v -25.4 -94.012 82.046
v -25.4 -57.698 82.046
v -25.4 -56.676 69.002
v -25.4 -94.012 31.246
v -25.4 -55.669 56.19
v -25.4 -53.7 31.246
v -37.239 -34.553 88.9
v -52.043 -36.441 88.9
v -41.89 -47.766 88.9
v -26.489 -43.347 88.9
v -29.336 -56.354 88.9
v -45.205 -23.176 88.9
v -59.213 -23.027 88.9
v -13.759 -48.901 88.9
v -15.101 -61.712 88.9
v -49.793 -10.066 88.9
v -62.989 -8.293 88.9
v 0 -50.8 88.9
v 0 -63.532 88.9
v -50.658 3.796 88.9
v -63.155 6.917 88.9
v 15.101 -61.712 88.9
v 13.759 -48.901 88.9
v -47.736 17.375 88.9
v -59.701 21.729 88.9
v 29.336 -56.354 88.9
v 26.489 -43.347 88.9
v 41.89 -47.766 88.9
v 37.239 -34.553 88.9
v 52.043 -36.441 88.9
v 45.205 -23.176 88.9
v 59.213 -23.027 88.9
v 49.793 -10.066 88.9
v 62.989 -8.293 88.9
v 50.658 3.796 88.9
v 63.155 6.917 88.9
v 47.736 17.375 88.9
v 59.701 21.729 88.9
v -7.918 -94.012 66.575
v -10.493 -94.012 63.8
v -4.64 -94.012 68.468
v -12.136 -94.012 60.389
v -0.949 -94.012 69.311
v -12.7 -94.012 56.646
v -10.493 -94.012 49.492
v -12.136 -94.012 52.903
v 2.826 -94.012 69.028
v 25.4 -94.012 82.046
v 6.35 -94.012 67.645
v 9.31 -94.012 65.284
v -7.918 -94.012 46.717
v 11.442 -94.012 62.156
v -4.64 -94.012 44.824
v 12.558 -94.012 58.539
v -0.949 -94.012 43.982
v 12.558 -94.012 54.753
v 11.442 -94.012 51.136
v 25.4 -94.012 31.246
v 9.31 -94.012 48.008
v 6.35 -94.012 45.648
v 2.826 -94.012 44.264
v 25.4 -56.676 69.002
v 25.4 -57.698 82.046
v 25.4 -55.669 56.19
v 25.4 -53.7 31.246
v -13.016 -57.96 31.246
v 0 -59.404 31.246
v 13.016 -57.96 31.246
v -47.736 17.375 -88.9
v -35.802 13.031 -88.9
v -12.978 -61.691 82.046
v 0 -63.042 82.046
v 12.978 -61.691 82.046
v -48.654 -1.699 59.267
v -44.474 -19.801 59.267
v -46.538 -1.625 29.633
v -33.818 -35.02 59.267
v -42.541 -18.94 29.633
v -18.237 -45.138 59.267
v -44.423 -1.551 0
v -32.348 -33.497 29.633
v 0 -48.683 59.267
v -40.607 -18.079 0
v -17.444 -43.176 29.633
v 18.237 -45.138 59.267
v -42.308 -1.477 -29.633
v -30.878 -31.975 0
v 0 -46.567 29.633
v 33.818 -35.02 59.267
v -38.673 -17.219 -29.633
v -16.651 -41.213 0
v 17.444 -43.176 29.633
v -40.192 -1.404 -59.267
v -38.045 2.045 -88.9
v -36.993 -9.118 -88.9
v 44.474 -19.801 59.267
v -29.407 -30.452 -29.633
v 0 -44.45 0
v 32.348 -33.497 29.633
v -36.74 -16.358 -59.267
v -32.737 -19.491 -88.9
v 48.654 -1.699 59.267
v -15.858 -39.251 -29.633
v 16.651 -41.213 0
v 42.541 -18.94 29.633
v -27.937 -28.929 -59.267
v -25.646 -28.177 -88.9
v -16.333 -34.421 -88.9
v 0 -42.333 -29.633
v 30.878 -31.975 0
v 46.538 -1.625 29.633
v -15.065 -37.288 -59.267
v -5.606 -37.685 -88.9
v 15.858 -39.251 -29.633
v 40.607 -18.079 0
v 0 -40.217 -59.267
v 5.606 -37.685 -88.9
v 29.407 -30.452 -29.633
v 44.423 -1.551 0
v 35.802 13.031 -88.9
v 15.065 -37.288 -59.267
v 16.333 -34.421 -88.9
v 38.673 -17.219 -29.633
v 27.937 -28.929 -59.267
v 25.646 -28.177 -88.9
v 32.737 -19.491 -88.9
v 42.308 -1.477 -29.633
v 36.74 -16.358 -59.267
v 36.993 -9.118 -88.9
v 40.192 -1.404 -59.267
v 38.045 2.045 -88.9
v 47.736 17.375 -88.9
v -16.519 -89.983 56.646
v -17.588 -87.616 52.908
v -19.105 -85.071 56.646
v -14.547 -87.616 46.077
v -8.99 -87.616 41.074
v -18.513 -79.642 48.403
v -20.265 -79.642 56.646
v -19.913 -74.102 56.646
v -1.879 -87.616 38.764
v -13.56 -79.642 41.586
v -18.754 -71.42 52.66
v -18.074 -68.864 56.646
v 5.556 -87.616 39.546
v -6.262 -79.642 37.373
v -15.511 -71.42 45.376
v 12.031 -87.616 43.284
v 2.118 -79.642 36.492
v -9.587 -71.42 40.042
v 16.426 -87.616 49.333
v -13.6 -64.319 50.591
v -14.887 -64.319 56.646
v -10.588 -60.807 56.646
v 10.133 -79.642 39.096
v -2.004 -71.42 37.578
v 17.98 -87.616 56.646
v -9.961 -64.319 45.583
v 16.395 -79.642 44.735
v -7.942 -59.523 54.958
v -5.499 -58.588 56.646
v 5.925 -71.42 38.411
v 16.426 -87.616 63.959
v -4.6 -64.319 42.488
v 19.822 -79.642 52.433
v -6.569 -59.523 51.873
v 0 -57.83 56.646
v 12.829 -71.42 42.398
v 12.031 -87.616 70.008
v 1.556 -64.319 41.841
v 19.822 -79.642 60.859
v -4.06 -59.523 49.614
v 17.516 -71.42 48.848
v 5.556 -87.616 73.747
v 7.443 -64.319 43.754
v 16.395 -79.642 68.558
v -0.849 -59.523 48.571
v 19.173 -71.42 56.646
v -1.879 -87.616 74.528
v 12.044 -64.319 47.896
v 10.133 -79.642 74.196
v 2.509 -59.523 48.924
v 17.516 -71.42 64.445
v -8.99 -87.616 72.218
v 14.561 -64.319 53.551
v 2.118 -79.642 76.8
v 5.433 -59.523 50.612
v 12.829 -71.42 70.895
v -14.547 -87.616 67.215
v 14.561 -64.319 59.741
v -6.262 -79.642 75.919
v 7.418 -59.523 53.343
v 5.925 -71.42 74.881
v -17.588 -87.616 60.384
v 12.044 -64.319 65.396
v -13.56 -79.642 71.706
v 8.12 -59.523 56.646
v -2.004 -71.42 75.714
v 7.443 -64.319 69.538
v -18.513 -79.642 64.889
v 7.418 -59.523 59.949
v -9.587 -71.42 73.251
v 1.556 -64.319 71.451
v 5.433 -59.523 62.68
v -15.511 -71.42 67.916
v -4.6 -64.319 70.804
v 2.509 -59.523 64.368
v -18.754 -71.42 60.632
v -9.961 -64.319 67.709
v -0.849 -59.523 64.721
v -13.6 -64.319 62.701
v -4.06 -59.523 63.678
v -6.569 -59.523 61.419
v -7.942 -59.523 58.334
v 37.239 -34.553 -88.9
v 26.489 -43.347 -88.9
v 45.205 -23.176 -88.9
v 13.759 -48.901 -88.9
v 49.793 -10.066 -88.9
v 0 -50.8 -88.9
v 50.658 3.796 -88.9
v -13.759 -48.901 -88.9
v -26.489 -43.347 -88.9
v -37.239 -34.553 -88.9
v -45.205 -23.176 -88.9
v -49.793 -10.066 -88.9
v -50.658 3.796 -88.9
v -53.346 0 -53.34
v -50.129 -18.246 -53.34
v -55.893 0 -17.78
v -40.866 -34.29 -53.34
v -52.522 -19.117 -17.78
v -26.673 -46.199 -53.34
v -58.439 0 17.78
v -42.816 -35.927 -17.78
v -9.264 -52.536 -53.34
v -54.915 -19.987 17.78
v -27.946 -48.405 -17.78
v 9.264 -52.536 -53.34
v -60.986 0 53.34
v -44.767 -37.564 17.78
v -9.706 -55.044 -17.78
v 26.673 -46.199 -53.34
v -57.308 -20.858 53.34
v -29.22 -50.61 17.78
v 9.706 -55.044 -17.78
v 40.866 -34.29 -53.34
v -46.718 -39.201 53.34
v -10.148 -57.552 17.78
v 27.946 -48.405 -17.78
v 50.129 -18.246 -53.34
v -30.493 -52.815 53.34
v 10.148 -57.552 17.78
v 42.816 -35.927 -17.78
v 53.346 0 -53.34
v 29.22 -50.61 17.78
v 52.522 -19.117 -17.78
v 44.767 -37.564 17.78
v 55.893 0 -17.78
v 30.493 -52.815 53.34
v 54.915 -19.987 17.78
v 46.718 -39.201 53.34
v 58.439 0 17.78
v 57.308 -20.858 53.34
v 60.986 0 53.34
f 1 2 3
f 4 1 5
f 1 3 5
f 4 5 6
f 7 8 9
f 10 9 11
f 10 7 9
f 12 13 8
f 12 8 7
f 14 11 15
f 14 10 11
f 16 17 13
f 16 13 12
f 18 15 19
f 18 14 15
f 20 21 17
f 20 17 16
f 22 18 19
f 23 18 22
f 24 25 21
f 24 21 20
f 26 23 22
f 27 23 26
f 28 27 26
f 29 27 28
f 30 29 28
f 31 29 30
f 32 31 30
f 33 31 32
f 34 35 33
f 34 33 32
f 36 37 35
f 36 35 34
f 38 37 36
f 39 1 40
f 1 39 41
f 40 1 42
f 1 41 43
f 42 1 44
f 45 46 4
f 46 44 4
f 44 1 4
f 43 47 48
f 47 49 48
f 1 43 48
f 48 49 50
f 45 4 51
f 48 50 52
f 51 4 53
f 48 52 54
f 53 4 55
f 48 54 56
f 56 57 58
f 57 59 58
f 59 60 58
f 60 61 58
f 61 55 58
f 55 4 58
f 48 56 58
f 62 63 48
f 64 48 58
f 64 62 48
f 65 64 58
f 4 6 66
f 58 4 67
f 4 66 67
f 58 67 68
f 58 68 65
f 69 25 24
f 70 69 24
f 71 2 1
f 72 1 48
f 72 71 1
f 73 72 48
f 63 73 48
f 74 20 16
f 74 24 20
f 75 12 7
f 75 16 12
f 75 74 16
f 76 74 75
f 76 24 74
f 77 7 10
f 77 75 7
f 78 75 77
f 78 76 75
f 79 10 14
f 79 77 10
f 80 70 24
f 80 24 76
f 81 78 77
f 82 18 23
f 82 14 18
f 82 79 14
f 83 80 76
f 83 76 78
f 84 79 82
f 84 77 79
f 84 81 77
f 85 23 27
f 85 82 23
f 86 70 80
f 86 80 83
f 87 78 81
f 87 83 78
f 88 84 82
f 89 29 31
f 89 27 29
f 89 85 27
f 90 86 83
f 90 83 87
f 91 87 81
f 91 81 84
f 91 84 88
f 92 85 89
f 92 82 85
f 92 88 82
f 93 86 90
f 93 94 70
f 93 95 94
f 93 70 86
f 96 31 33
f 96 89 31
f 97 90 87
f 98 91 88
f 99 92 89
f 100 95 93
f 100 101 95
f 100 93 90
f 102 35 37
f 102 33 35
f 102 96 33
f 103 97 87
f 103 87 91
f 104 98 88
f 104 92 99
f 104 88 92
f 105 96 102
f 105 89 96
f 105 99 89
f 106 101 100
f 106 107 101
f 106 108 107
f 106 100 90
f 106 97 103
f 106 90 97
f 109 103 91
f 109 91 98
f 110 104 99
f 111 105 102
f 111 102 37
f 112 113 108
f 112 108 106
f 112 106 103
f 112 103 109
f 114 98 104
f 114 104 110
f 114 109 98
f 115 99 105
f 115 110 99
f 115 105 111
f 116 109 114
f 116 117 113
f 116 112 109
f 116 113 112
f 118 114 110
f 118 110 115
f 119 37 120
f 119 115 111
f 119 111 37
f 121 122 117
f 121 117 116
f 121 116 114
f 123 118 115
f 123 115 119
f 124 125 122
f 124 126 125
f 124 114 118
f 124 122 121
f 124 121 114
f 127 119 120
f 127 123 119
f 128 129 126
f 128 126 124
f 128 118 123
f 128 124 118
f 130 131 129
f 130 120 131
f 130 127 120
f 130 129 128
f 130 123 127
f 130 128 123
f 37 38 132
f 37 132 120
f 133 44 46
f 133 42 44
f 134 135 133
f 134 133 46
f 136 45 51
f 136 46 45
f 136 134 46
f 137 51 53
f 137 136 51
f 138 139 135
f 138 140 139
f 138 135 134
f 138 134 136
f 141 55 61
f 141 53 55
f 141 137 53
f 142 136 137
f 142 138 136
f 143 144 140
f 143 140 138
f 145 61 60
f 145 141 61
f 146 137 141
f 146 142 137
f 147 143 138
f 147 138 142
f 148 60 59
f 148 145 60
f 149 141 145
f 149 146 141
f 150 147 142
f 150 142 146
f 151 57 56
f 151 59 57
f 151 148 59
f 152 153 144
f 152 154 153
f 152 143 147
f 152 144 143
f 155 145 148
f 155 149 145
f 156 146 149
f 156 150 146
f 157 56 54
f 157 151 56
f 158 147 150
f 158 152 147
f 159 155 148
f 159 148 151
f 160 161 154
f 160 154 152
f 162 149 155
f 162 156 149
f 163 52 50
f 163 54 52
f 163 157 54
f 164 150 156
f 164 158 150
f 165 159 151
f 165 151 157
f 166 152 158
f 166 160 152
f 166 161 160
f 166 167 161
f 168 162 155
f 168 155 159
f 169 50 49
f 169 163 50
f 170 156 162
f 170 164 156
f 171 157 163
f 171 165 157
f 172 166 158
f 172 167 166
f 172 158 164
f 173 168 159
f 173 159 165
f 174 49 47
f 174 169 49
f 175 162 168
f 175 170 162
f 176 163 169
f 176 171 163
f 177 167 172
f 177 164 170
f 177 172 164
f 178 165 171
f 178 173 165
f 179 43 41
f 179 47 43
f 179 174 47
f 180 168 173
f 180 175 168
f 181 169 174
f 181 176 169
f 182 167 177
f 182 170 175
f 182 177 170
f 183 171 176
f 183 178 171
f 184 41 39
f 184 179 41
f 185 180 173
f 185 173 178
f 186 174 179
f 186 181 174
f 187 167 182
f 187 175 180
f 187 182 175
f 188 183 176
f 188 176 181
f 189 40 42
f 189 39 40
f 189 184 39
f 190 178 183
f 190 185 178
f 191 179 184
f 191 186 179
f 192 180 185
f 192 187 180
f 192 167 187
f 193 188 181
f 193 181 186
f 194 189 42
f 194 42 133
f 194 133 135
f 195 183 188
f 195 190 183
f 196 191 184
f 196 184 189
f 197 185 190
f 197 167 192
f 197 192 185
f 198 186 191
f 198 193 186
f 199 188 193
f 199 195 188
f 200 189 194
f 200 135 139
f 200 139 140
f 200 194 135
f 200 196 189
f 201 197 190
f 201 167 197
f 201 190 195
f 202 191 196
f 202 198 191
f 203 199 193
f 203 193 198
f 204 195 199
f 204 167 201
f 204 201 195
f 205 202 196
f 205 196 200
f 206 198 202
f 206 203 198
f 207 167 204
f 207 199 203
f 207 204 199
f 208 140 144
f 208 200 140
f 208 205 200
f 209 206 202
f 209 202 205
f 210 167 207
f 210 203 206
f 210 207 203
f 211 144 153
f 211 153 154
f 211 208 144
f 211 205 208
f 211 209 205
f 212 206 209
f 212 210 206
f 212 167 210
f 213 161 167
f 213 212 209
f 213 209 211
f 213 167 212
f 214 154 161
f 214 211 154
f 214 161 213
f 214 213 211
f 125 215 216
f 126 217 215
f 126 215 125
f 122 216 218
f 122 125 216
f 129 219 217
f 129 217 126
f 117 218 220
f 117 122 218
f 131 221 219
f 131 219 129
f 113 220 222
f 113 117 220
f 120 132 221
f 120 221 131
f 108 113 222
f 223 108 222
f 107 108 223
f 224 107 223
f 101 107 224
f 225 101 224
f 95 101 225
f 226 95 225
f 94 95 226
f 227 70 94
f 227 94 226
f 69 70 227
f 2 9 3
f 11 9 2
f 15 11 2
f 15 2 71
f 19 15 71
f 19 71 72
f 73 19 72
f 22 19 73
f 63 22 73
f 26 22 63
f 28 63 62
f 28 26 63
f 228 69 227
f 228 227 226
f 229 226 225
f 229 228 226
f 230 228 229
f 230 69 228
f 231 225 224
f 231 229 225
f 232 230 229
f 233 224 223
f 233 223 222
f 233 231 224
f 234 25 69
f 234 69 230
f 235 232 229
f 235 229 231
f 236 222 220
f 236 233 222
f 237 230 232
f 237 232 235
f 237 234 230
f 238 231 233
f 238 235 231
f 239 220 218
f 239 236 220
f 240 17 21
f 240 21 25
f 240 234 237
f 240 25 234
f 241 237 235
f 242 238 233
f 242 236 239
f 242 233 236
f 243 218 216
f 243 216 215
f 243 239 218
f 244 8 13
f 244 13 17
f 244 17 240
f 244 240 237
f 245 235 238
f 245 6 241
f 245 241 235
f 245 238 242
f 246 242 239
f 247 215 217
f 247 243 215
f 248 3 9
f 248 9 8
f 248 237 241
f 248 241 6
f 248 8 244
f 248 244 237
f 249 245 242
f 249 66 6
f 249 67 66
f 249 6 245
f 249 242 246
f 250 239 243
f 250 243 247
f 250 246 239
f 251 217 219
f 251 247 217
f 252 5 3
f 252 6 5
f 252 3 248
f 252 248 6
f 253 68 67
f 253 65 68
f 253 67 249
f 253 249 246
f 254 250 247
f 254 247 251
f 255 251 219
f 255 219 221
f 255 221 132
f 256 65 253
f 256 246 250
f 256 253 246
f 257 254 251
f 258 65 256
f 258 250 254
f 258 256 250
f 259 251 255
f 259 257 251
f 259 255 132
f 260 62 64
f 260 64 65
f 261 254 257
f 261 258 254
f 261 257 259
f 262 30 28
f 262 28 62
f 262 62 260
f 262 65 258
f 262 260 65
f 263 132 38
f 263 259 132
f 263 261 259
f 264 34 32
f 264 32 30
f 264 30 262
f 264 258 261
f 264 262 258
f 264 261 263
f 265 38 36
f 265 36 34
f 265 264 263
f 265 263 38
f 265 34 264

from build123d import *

# Parameters (mm, degrees)
REVOLVE1_ANGLE                  = 200
REVOLVE1_OTHER_WAY_ANGLE        = 20
BOSS_EXTRUDE1_REACH             = 140.597
SKETCH2_W                       = 50.8
SKETCH2_H                       = 50.8
BOSS_EXTRUDE1_DIRECTION_2_DEPTH = 30.48


with BuildPart() as part:
    # Sketch1 → Revolve1 (revolve)
    with BuildSketch(Plane(origin=(0, 0, 0), x_dir=(1, 0, 0), z_dir=(0, 1, 0))):
        Polygon((50.8, 88.9), (63.53235674, -88.9), (50.8, -88.9), (38.1, 88.9), align=None)
    revolve(axis=Axis((0, 0, 0), (0, 0, -1)), revolution_arc=REVOLVE1_ANGLE)

    # Sketch1 → Revolve1 other way (revolve)
    with BuildSketch(Plane(origin=(0, 0, 0), x_dir=(1, 0, 0), z_dir=(0, 1, 0))):
        Polygon((50.8, 88.9), (63.53235674, -88.9), (50.8, -88.9), (38.1, 88.9), align=None)
    revolve(axis=Axis((0, 0, 0), (0, 0, 1)), revolution_arc=REVOLVE1_OTHER_WAY_ANGLE)

    # Boss-Extrude1: up to this cone (the profile starts outside it)
    boss_extrude1_end = Plane(origin=(0, 0, 56.646058), z_dir=(0, 0, 1)) * Cone(46.734412691, 75.710855393, 404.639268083, mode=Mode.PRIVATE)
    # Sketch2 → Boss-Extrude1 (add, up to the surface)
    with BuildSketch(Plane(origin=(0, -63.53235674, 0), x_dir=(1, 0, 0), z_dir=(0, 1, 0)), mode=Mode.PRIVATE) as boss_extrude1_sk1:
        with Locations((0, -56.646058408)):
            Rectangle(SKETCH2_W, SKETCH2_H)
    boss_extrude1_tool1 = extrude(boss_extrude1_sk1.sketch, amount=BOSS_EXTRUDE1_REACH, mode=Mode.PRIVATE) - boss_extrude1_end
    add(boss_extrude1_tool1.solids().sort_by_distance((0, -63.532357, 56.646058))[0])

    # Sketch2 → Boss-Extrude1 direction 2 (add)
    with BuildSketch(Plane(origin=(0, -63.53235674, 0), x_dir=(1, 0, 0), z_dir=(0, 1, 0))):
        with Locations((0, -56.646058408)):
            Rectangle(SKETCH2_W, SKETCH2_H)
    extrude(amount=-BOSS_EXTRUDE1_DIRECTION_2_DEPTH)

    # Sketch3 → Cut-Revolve2 (revolve, cut)
    with BuildSketch(Plane.XY.offset(56.646058408)):
        with BuildLine():
            Line((0, -57.830061824), (0, -98.470061824))
            ThreePointArc((0, -98.470061824), (-20.32, -78.150061824), (0, -57.830061824))
        make_face()
    revolve(axis=Axis((0, -78.150061824, 56.646058408), (0, -1, 0)), mode=Mode.SUBTRACT)


solid = part.part
